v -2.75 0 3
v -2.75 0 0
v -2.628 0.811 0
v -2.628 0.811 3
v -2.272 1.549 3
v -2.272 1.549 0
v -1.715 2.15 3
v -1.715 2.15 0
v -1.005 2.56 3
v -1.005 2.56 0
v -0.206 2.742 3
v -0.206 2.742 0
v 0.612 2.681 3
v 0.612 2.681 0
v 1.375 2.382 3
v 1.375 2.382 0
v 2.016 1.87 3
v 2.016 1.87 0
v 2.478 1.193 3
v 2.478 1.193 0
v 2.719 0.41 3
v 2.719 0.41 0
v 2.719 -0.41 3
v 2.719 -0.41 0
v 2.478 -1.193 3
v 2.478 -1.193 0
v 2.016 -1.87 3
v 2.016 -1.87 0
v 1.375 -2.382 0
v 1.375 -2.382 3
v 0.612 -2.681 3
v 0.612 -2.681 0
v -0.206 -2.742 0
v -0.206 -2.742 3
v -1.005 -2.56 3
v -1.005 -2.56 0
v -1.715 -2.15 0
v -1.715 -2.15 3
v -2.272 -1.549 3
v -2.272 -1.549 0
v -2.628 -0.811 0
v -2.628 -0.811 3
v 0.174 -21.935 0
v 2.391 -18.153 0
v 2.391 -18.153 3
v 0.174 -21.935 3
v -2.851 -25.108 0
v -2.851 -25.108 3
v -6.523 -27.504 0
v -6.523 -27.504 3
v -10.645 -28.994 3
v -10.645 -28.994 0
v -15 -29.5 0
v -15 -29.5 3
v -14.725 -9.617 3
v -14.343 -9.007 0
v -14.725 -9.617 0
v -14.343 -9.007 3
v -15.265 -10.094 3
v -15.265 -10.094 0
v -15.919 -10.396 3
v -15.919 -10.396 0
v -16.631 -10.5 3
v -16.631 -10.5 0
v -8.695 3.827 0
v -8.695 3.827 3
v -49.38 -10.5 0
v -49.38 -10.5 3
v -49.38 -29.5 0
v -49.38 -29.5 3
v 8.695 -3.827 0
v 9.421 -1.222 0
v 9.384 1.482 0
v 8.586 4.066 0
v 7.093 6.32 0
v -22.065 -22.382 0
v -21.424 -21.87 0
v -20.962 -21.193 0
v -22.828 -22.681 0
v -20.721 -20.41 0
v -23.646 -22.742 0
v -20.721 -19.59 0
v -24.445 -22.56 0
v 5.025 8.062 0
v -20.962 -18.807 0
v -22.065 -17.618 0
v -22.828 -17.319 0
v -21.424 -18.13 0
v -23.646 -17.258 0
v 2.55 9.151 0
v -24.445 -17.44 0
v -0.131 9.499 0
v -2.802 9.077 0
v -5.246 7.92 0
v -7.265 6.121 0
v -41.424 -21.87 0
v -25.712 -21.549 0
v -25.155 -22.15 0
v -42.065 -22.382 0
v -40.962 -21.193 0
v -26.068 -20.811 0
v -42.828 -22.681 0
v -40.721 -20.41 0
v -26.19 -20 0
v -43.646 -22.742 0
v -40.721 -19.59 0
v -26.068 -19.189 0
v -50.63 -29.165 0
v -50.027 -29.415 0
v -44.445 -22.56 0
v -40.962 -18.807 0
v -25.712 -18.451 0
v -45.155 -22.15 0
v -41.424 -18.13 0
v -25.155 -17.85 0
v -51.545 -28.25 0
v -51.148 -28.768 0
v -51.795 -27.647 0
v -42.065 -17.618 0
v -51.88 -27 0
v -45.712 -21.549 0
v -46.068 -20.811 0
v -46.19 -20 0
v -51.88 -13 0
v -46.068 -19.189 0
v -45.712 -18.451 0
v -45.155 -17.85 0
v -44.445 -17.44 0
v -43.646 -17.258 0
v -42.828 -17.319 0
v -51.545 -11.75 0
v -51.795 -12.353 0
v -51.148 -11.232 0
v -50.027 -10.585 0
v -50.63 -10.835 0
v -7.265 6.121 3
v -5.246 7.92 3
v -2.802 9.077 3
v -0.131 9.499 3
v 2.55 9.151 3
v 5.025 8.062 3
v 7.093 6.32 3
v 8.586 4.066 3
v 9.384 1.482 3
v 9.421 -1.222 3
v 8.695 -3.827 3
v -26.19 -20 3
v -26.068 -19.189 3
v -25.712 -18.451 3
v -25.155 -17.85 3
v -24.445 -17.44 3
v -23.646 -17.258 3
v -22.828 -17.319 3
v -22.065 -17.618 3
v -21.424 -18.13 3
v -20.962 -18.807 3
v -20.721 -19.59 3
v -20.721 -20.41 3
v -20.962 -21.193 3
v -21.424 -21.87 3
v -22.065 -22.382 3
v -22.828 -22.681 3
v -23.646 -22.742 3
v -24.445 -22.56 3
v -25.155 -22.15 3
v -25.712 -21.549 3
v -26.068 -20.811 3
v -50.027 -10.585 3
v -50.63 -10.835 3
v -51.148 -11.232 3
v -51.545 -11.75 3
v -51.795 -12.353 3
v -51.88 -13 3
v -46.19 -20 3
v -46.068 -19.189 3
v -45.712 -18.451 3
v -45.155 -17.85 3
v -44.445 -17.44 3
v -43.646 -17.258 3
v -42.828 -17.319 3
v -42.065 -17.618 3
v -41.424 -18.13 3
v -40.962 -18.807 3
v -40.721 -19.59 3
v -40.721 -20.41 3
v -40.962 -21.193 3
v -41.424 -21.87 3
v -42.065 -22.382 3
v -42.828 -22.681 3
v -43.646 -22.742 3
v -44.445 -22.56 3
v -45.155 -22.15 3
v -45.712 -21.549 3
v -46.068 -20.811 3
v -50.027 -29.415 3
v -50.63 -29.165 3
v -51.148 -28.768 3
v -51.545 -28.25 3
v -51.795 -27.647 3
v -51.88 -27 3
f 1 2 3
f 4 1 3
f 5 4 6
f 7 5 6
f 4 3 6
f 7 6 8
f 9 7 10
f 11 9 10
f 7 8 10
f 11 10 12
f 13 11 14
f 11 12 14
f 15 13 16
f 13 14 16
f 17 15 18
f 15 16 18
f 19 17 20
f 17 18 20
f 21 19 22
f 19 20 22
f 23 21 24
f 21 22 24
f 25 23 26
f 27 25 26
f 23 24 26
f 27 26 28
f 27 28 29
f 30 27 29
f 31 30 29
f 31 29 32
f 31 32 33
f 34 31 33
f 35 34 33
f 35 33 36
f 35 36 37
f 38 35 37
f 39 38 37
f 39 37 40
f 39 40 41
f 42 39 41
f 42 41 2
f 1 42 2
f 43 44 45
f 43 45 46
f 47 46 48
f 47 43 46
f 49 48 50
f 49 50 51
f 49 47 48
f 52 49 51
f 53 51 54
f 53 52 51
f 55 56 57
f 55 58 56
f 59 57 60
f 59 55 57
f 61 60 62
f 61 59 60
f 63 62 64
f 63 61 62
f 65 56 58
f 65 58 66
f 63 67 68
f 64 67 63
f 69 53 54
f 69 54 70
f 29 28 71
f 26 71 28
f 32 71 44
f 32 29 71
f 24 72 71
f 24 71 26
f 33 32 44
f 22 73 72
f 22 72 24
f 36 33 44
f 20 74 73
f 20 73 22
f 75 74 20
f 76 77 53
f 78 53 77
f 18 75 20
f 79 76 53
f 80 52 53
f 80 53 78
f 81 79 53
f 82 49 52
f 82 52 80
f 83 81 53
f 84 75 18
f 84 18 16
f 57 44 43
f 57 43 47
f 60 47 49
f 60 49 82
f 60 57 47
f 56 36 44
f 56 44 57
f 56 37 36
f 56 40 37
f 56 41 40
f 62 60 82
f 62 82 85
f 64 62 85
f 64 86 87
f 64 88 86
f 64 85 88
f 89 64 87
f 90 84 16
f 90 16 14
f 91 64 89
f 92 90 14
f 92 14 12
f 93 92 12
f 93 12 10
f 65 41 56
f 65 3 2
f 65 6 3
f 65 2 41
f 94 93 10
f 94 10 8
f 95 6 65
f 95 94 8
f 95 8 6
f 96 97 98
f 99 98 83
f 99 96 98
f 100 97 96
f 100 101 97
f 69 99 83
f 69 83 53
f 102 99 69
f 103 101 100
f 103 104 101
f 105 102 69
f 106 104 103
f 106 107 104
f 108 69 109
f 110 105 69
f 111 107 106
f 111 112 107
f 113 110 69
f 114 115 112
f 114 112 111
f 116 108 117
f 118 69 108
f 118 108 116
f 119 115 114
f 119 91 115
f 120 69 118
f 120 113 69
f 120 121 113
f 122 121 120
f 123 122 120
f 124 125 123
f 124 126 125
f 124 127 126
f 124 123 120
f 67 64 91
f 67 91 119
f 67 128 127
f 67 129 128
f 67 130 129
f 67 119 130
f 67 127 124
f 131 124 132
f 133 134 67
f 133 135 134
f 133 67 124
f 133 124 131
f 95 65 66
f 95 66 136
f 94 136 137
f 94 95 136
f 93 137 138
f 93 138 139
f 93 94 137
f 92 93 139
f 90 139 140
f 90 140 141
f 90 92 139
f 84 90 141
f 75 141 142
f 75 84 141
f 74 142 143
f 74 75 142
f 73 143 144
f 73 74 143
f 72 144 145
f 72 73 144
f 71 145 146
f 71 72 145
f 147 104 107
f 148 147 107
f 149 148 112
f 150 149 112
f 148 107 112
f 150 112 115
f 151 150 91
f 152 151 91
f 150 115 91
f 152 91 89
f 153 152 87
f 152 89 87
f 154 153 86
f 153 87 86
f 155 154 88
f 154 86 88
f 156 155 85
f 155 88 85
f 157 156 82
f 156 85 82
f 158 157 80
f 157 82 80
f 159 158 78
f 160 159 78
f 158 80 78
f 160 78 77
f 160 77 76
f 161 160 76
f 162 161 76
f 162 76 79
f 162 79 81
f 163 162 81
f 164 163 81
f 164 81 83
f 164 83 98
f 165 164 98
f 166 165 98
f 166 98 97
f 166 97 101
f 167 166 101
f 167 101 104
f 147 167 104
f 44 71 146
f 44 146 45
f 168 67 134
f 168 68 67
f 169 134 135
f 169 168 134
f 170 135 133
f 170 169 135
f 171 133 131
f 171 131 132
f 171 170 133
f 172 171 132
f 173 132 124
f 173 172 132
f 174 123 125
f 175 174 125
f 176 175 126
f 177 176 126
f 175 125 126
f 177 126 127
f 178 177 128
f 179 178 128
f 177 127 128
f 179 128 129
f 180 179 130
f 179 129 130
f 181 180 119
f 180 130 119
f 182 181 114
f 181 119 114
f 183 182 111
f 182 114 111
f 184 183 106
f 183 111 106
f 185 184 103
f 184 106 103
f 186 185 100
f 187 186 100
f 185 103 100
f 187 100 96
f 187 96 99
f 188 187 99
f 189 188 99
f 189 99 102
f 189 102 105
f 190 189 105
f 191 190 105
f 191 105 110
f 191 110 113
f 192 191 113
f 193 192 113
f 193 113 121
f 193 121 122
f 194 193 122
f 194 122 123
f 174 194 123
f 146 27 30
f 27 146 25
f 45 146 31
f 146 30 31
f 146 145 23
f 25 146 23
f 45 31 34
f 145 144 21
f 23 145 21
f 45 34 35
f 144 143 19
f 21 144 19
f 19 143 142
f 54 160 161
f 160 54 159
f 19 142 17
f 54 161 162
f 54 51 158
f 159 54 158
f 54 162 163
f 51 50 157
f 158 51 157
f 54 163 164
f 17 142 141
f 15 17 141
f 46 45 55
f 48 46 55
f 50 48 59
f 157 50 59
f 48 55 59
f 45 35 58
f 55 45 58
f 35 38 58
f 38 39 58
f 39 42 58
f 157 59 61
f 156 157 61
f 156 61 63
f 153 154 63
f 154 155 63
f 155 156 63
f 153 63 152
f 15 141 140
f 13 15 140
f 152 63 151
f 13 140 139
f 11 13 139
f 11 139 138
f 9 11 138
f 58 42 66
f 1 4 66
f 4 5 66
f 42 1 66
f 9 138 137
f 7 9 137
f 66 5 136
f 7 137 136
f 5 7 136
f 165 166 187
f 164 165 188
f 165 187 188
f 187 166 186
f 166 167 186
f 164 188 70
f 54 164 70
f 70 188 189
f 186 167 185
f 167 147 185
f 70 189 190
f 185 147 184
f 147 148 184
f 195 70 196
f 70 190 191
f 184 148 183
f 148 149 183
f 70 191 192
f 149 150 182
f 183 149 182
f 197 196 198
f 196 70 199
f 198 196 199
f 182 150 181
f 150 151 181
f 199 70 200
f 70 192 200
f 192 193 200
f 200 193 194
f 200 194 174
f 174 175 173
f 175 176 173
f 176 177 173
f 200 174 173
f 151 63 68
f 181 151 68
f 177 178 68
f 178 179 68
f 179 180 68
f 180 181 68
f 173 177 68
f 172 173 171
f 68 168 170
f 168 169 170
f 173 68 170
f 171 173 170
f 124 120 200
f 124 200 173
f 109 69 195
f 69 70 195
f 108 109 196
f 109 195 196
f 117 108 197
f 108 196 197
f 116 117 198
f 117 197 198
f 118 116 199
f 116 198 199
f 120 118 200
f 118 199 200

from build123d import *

# Parameters (mm, degrees)
BOSS_EXTRUDE1_DEPTH  = 3
M5_CLEARANCE_HOLE1_D = 5.5
M5_CLEARANCE_HOLE2_D = 5.5
M5_CLEARANCE_HOLE3_D = 5.5
FILLET2_R            = 2.5


with BuildPart() as part:
    # Sketch1 → Boss-Extrude1 (new body)
    with BuildSketch(Plane.XY):
        with BuildLine():
            Line((8.695255676, -3.826555727), (2.390511351, -18.153111454))
            ThreePointArc((2.390511351, -18.153111454), (-4.61754166, -26.412402673), (-15, -29.5))
            Line((-15, -29.5), (-51.88, -29.5))
            Line((-51.88, -29.5), (-51.88, -10.5))
            Line((-51.88, -10.5), (-15, -10.5))
            Line((-15, -10.5), (-8.695255676, 3.826555727))
            ThreePointArc((-8.695255676, 3.826555727), (3.826555727, 8.695255676), (8.695255676, -3.826555727))
        make_face()
    extrude(amount=BOSS_EXTRUDE1_DEPTH)

    # M5 Clearance Hole1 (through all)
    with Locations(Plane.XY.offset(3)):
        with Locations((-43.44, -20)):
            Hole(M5_CLEARANCE_HOLE1_D / 2)

    # M5 Clearance Hole2 (through all)
    with Locations(Plane.XY.offset(3)):
        with Locations((-23.44, -20)):
            Hole(M5_CLEARANCE_HOLE2_D / 2)

    # M5 Clearance Hole3 (through all)
    with Locations(Plane.XY.offset(3)):
        with Locations((0, 0)):
            Hole(M5_CLEARANCE_HOLE3_D / 2)

    # Fillet2
    fillet2_edges = [part.edges().sort_by_distance(p)[0] for p in [
        (-51.88, -29.5, 1.5),
        (-51.88, -10.5, 1.5),
        (-15, -10.5, 1.5),
    ]]
    fillet(fillet2_edges, radius=FILLET2_R)


solid = part.part
